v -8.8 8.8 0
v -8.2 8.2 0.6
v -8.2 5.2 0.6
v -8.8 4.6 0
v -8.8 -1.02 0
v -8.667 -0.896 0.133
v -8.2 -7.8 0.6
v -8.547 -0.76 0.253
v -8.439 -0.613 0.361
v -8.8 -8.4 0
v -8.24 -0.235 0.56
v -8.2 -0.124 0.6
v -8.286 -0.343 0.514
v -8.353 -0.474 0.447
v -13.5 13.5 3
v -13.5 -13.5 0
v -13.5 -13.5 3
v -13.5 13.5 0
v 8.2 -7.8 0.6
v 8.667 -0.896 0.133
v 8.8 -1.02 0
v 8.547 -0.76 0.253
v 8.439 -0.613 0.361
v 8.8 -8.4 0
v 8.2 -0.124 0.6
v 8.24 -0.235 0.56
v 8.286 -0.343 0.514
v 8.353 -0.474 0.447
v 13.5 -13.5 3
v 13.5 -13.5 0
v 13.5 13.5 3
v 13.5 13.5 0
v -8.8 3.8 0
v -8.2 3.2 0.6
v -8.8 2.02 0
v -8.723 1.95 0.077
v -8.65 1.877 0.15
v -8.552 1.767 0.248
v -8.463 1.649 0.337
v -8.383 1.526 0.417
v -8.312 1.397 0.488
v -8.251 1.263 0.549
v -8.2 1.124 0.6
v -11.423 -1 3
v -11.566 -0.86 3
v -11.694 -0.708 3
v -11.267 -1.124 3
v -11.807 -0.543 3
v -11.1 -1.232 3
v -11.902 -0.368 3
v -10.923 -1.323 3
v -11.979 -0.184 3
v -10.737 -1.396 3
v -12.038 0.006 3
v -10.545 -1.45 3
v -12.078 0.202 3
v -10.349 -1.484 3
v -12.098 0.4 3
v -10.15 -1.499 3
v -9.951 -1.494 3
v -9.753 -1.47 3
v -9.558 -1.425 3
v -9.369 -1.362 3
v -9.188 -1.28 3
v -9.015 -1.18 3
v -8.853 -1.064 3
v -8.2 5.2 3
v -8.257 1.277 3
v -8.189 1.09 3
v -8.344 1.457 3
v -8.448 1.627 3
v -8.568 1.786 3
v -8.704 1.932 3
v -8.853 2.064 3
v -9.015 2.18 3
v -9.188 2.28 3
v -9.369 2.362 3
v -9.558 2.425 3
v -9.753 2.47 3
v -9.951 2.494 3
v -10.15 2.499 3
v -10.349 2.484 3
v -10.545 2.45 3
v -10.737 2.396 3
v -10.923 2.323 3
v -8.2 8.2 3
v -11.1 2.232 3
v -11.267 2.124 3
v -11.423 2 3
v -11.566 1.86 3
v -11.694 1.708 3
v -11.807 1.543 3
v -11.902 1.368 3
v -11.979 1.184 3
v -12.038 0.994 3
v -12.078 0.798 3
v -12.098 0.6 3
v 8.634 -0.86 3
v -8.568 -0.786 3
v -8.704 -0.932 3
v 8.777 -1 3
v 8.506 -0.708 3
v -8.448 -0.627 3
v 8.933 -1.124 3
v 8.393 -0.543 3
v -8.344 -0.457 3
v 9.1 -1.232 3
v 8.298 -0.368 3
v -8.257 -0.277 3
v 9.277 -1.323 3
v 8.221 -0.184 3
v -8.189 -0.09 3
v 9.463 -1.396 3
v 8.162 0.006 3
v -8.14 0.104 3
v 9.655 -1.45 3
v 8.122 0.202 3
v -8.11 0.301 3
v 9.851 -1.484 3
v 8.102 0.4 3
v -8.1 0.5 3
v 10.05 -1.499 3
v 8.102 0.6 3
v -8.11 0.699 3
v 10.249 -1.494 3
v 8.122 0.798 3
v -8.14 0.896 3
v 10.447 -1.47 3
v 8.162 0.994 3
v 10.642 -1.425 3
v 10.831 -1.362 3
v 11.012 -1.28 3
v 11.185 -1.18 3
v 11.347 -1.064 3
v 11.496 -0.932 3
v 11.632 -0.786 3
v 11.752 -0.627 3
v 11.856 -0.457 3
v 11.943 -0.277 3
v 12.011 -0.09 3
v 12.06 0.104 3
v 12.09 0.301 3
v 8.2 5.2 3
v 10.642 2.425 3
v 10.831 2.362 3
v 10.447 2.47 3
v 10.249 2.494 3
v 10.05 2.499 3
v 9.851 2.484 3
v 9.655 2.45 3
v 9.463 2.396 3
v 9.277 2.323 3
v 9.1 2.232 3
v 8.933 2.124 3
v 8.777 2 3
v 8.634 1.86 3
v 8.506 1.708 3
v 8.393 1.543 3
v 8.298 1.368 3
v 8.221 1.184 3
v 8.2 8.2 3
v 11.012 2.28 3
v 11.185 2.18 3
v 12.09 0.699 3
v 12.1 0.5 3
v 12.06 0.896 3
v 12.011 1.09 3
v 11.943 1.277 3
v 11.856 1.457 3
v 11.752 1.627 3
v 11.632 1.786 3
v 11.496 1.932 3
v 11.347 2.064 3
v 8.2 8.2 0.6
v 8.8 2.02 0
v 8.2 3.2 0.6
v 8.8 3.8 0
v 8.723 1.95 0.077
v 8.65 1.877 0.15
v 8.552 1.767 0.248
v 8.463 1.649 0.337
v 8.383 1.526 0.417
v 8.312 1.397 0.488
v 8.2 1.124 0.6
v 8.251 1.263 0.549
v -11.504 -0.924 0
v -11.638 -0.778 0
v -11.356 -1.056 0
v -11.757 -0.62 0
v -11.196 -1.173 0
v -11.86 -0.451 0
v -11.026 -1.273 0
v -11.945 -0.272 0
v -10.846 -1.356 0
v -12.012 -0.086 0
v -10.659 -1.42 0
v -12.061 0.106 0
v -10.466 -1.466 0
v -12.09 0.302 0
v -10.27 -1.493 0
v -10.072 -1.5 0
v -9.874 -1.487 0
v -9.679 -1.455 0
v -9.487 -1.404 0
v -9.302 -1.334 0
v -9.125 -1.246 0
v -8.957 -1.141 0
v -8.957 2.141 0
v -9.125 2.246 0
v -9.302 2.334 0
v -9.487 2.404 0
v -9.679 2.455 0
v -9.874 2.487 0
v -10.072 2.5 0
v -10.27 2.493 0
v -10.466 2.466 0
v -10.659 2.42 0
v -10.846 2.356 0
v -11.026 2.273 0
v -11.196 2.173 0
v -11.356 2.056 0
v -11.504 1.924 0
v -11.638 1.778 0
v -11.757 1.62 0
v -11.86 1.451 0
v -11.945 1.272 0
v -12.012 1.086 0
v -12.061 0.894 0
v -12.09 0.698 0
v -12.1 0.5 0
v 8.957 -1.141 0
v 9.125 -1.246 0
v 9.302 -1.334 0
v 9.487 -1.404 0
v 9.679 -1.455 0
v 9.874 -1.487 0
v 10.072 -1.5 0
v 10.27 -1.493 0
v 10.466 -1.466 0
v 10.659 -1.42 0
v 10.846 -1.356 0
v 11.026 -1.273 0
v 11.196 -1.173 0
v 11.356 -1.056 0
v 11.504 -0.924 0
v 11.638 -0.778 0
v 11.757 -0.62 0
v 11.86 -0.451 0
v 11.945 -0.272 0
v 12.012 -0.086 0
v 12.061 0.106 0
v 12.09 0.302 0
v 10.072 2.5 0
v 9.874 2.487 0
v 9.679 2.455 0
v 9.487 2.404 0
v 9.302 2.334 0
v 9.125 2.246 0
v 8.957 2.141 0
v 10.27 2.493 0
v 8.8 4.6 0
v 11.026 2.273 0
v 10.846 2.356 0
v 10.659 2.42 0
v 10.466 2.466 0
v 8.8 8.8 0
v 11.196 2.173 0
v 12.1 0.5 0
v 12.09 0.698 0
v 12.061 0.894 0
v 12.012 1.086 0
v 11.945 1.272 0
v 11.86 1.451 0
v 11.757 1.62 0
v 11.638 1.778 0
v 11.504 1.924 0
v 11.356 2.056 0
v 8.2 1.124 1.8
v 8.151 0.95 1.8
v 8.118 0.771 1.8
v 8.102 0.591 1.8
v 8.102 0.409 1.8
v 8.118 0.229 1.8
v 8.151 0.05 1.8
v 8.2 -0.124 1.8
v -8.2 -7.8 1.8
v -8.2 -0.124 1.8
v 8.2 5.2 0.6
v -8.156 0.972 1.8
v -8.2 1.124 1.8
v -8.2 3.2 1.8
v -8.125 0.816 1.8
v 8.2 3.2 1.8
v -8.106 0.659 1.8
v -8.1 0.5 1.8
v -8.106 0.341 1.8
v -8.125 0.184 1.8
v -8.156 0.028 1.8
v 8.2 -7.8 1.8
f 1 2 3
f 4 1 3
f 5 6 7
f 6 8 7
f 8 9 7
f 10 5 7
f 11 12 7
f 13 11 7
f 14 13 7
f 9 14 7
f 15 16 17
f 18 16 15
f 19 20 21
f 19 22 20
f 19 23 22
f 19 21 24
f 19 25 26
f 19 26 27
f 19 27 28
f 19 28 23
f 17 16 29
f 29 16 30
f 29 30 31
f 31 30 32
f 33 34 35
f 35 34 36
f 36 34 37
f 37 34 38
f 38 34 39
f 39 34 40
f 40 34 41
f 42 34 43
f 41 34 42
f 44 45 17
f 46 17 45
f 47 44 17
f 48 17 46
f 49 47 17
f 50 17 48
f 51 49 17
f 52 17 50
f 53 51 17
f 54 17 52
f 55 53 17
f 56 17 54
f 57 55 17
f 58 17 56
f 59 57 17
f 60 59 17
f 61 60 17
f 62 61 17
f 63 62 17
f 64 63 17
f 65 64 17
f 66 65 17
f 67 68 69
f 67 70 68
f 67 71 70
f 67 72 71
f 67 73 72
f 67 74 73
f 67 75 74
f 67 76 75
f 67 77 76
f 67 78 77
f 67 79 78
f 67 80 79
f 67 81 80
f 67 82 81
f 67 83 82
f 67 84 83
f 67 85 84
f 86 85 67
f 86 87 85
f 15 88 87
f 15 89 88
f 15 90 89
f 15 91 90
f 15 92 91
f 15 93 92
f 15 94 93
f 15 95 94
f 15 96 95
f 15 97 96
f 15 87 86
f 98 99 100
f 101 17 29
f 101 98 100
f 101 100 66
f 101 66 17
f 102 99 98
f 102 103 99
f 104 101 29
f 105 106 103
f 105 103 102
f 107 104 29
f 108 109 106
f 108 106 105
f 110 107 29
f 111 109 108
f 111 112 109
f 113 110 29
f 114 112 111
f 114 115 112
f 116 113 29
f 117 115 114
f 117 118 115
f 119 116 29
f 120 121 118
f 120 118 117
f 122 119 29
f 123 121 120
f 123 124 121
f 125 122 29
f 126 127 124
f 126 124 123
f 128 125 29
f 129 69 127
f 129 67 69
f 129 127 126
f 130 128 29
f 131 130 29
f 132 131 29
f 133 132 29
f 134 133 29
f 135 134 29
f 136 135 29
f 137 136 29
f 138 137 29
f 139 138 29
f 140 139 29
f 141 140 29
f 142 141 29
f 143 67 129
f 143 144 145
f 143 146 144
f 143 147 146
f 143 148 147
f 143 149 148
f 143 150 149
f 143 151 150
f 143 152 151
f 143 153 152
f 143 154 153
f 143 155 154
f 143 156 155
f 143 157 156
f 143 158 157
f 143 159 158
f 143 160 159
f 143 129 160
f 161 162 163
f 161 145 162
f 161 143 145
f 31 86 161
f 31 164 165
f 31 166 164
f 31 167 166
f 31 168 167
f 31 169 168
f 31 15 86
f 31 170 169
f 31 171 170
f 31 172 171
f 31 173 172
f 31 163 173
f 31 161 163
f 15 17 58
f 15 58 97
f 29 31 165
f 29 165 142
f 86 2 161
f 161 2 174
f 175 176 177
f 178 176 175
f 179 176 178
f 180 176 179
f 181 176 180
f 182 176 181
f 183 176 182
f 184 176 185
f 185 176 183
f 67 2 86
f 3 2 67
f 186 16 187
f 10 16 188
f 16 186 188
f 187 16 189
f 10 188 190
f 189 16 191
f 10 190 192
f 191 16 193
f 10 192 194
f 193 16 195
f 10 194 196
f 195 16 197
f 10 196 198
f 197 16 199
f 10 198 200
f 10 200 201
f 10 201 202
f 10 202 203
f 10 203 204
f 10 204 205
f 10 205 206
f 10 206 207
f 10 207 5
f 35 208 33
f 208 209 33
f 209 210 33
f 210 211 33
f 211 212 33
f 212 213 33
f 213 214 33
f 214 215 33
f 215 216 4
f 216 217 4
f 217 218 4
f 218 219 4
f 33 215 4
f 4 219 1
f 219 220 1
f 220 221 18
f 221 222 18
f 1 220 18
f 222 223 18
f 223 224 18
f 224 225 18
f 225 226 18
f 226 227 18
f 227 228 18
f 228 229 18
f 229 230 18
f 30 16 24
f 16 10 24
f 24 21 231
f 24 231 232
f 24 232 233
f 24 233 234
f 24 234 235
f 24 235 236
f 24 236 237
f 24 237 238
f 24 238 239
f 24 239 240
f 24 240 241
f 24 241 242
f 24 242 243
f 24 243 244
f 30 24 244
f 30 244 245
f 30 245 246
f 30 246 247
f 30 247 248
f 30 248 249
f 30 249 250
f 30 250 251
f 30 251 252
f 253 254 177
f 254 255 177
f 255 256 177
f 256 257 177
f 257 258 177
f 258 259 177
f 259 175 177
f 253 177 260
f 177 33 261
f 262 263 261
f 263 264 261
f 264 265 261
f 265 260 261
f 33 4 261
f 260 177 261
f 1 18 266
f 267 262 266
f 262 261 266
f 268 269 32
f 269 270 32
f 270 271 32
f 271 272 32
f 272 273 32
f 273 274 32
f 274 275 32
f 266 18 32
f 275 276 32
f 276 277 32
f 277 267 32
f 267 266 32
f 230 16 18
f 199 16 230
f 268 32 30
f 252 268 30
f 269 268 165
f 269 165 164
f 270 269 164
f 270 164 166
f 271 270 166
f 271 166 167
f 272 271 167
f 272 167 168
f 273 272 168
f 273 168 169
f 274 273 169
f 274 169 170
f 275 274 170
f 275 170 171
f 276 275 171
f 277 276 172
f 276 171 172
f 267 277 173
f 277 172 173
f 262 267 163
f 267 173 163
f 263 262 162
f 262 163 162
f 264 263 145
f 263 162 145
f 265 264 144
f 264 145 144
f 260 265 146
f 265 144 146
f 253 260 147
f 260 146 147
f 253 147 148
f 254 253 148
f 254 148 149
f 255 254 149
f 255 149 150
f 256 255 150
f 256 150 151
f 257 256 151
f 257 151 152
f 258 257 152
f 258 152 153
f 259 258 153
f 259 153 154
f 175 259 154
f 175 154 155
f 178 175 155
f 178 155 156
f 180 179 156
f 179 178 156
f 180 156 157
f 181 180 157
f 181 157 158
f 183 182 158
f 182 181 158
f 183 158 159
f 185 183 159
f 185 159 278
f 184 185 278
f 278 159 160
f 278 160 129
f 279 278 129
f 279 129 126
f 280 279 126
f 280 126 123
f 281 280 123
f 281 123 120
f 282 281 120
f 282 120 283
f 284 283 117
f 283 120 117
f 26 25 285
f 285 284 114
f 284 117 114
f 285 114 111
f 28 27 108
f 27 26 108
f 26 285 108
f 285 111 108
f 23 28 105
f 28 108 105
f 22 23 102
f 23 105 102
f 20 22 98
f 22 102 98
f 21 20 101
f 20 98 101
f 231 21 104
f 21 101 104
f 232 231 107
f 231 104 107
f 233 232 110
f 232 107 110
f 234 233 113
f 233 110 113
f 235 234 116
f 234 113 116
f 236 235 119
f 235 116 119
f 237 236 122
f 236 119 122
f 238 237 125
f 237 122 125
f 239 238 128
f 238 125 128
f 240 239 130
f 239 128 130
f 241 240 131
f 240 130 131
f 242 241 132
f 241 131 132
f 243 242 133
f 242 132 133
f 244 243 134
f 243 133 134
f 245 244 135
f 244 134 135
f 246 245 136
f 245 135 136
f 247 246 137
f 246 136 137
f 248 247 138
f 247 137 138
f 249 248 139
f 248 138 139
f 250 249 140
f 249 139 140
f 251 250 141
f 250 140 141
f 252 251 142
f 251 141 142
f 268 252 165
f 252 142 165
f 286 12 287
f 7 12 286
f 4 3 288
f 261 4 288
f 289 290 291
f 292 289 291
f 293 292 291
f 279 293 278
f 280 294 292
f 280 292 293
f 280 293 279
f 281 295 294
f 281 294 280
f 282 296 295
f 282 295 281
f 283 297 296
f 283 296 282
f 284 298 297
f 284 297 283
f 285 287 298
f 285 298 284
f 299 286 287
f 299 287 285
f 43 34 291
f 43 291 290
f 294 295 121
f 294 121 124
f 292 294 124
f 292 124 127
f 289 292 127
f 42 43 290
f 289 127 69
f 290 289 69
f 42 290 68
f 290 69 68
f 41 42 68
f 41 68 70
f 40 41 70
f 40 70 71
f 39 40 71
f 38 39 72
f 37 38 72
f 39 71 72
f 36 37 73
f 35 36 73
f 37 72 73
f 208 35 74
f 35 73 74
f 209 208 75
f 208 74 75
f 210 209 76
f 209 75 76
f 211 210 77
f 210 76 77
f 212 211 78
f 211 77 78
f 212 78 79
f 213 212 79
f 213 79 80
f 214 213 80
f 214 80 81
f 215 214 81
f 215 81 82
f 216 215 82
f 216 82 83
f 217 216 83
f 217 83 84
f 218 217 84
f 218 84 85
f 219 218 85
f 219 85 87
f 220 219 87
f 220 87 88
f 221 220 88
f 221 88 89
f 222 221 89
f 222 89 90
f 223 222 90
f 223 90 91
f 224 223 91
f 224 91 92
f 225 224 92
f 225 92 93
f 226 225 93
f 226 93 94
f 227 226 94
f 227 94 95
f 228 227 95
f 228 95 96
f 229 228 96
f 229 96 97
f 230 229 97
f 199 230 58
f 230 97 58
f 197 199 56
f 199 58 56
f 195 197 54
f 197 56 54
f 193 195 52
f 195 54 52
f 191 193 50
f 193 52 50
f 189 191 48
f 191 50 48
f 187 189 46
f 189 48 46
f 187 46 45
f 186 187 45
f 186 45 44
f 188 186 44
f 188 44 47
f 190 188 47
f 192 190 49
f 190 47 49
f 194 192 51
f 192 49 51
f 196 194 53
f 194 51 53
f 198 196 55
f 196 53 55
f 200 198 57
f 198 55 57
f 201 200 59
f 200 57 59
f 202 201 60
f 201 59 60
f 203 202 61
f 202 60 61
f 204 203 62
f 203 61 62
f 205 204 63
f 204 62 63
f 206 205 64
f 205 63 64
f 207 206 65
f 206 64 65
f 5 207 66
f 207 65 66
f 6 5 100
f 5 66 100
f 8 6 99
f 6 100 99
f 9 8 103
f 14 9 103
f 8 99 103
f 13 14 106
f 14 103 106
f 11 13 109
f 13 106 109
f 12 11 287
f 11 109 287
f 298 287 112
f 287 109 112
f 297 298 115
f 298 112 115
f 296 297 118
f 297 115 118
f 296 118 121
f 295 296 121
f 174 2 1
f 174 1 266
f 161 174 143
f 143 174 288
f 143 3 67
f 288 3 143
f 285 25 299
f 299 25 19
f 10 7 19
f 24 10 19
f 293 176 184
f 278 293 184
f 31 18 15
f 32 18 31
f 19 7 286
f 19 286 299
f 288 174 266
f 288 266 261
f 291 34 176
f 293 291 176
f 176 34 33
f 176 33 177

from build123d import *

# Parameters (mm, degrees)
SKETCH_W        = 27
SKETCH_H        = 27
PAD_DEPTH       = 3
SKETCH001_W     = 16.4
SKETCH001_H     = 3
POCKET_DEPTH    = 5
SKETCH002_W     = 16.4
SKETCH002_H     = 11
POCKET001_DEPTH = 1.8
CHAMFER_SIZE    = 0.6
SKETCH003_R     = 2
POCKET002_DEPTH = 3.001


with BuildPart() as part:
    # Sketch → Pad (new body)
    with BuildSketch(Plane.XY):
        Rectangle(SKETCH_W, SKETCH_H)
    extrude(amount=PAD_DEPTH)

    # Sketch001 (on Face5 of Pad) → Pocket (cut)
    with BuildSketch(Plane(origin=(0, 0, 0), x_dir=(1, 0, 0), z_dir=(0, 0, -1))):
        with Locations((0, -6.7)):
            Rectangle(SKETCH001_W, SKETCH001_H)
    extrude(amount=-POCKET_DEPTH, mode=Mode.SUBTRACT)

    # Sketch002 (on Face4 of Pocket) → Pocket001 (cut)
    with BuildSketch(Plane(origin=(0, 0, 0), x_dir=(1, 0, 0), z_dir=(0, 0, -1))):
        with Locations((0, 2.3)):
            Rectangle(SKETCH002_W, SKETCH002_H)
    extrude(amount=-POCKET001_DEPTH, mode=Mode.SUBTRACT)

    # Chamfer
    chamfer_edges = [part.edges().sort_by_distance(p)[0] for p in [
        (8.2, -2.3, 0),
        (0, -7.8, 0),
        (-8.2, -2.3, 0),
        (0, 3.2, 0),
        (0, 5.2, 0),
        (8.2, 6.7, 0),
        (0, 8.2, 0),
        (-8.2, 6.7, 0),
    ]]
    chamfer(chamfer_edges, length=CHAMFER_SIZE)

    # Sketch003 (on Face18 of Chamfer) → Pocket002 (cut, through all)
    with BuildSketch(Plane.XY.offset(3)):
        with Locations((-10.1, 0.5)):
            Circle(SKETCH003_R)
        with Locations((10.1, 0.5)):
            Circle(SKETCH003_R)
    extrude(amount=-POCKET002_DEPTH, mode=Mode.SUBTRACT)


solid = part.part
